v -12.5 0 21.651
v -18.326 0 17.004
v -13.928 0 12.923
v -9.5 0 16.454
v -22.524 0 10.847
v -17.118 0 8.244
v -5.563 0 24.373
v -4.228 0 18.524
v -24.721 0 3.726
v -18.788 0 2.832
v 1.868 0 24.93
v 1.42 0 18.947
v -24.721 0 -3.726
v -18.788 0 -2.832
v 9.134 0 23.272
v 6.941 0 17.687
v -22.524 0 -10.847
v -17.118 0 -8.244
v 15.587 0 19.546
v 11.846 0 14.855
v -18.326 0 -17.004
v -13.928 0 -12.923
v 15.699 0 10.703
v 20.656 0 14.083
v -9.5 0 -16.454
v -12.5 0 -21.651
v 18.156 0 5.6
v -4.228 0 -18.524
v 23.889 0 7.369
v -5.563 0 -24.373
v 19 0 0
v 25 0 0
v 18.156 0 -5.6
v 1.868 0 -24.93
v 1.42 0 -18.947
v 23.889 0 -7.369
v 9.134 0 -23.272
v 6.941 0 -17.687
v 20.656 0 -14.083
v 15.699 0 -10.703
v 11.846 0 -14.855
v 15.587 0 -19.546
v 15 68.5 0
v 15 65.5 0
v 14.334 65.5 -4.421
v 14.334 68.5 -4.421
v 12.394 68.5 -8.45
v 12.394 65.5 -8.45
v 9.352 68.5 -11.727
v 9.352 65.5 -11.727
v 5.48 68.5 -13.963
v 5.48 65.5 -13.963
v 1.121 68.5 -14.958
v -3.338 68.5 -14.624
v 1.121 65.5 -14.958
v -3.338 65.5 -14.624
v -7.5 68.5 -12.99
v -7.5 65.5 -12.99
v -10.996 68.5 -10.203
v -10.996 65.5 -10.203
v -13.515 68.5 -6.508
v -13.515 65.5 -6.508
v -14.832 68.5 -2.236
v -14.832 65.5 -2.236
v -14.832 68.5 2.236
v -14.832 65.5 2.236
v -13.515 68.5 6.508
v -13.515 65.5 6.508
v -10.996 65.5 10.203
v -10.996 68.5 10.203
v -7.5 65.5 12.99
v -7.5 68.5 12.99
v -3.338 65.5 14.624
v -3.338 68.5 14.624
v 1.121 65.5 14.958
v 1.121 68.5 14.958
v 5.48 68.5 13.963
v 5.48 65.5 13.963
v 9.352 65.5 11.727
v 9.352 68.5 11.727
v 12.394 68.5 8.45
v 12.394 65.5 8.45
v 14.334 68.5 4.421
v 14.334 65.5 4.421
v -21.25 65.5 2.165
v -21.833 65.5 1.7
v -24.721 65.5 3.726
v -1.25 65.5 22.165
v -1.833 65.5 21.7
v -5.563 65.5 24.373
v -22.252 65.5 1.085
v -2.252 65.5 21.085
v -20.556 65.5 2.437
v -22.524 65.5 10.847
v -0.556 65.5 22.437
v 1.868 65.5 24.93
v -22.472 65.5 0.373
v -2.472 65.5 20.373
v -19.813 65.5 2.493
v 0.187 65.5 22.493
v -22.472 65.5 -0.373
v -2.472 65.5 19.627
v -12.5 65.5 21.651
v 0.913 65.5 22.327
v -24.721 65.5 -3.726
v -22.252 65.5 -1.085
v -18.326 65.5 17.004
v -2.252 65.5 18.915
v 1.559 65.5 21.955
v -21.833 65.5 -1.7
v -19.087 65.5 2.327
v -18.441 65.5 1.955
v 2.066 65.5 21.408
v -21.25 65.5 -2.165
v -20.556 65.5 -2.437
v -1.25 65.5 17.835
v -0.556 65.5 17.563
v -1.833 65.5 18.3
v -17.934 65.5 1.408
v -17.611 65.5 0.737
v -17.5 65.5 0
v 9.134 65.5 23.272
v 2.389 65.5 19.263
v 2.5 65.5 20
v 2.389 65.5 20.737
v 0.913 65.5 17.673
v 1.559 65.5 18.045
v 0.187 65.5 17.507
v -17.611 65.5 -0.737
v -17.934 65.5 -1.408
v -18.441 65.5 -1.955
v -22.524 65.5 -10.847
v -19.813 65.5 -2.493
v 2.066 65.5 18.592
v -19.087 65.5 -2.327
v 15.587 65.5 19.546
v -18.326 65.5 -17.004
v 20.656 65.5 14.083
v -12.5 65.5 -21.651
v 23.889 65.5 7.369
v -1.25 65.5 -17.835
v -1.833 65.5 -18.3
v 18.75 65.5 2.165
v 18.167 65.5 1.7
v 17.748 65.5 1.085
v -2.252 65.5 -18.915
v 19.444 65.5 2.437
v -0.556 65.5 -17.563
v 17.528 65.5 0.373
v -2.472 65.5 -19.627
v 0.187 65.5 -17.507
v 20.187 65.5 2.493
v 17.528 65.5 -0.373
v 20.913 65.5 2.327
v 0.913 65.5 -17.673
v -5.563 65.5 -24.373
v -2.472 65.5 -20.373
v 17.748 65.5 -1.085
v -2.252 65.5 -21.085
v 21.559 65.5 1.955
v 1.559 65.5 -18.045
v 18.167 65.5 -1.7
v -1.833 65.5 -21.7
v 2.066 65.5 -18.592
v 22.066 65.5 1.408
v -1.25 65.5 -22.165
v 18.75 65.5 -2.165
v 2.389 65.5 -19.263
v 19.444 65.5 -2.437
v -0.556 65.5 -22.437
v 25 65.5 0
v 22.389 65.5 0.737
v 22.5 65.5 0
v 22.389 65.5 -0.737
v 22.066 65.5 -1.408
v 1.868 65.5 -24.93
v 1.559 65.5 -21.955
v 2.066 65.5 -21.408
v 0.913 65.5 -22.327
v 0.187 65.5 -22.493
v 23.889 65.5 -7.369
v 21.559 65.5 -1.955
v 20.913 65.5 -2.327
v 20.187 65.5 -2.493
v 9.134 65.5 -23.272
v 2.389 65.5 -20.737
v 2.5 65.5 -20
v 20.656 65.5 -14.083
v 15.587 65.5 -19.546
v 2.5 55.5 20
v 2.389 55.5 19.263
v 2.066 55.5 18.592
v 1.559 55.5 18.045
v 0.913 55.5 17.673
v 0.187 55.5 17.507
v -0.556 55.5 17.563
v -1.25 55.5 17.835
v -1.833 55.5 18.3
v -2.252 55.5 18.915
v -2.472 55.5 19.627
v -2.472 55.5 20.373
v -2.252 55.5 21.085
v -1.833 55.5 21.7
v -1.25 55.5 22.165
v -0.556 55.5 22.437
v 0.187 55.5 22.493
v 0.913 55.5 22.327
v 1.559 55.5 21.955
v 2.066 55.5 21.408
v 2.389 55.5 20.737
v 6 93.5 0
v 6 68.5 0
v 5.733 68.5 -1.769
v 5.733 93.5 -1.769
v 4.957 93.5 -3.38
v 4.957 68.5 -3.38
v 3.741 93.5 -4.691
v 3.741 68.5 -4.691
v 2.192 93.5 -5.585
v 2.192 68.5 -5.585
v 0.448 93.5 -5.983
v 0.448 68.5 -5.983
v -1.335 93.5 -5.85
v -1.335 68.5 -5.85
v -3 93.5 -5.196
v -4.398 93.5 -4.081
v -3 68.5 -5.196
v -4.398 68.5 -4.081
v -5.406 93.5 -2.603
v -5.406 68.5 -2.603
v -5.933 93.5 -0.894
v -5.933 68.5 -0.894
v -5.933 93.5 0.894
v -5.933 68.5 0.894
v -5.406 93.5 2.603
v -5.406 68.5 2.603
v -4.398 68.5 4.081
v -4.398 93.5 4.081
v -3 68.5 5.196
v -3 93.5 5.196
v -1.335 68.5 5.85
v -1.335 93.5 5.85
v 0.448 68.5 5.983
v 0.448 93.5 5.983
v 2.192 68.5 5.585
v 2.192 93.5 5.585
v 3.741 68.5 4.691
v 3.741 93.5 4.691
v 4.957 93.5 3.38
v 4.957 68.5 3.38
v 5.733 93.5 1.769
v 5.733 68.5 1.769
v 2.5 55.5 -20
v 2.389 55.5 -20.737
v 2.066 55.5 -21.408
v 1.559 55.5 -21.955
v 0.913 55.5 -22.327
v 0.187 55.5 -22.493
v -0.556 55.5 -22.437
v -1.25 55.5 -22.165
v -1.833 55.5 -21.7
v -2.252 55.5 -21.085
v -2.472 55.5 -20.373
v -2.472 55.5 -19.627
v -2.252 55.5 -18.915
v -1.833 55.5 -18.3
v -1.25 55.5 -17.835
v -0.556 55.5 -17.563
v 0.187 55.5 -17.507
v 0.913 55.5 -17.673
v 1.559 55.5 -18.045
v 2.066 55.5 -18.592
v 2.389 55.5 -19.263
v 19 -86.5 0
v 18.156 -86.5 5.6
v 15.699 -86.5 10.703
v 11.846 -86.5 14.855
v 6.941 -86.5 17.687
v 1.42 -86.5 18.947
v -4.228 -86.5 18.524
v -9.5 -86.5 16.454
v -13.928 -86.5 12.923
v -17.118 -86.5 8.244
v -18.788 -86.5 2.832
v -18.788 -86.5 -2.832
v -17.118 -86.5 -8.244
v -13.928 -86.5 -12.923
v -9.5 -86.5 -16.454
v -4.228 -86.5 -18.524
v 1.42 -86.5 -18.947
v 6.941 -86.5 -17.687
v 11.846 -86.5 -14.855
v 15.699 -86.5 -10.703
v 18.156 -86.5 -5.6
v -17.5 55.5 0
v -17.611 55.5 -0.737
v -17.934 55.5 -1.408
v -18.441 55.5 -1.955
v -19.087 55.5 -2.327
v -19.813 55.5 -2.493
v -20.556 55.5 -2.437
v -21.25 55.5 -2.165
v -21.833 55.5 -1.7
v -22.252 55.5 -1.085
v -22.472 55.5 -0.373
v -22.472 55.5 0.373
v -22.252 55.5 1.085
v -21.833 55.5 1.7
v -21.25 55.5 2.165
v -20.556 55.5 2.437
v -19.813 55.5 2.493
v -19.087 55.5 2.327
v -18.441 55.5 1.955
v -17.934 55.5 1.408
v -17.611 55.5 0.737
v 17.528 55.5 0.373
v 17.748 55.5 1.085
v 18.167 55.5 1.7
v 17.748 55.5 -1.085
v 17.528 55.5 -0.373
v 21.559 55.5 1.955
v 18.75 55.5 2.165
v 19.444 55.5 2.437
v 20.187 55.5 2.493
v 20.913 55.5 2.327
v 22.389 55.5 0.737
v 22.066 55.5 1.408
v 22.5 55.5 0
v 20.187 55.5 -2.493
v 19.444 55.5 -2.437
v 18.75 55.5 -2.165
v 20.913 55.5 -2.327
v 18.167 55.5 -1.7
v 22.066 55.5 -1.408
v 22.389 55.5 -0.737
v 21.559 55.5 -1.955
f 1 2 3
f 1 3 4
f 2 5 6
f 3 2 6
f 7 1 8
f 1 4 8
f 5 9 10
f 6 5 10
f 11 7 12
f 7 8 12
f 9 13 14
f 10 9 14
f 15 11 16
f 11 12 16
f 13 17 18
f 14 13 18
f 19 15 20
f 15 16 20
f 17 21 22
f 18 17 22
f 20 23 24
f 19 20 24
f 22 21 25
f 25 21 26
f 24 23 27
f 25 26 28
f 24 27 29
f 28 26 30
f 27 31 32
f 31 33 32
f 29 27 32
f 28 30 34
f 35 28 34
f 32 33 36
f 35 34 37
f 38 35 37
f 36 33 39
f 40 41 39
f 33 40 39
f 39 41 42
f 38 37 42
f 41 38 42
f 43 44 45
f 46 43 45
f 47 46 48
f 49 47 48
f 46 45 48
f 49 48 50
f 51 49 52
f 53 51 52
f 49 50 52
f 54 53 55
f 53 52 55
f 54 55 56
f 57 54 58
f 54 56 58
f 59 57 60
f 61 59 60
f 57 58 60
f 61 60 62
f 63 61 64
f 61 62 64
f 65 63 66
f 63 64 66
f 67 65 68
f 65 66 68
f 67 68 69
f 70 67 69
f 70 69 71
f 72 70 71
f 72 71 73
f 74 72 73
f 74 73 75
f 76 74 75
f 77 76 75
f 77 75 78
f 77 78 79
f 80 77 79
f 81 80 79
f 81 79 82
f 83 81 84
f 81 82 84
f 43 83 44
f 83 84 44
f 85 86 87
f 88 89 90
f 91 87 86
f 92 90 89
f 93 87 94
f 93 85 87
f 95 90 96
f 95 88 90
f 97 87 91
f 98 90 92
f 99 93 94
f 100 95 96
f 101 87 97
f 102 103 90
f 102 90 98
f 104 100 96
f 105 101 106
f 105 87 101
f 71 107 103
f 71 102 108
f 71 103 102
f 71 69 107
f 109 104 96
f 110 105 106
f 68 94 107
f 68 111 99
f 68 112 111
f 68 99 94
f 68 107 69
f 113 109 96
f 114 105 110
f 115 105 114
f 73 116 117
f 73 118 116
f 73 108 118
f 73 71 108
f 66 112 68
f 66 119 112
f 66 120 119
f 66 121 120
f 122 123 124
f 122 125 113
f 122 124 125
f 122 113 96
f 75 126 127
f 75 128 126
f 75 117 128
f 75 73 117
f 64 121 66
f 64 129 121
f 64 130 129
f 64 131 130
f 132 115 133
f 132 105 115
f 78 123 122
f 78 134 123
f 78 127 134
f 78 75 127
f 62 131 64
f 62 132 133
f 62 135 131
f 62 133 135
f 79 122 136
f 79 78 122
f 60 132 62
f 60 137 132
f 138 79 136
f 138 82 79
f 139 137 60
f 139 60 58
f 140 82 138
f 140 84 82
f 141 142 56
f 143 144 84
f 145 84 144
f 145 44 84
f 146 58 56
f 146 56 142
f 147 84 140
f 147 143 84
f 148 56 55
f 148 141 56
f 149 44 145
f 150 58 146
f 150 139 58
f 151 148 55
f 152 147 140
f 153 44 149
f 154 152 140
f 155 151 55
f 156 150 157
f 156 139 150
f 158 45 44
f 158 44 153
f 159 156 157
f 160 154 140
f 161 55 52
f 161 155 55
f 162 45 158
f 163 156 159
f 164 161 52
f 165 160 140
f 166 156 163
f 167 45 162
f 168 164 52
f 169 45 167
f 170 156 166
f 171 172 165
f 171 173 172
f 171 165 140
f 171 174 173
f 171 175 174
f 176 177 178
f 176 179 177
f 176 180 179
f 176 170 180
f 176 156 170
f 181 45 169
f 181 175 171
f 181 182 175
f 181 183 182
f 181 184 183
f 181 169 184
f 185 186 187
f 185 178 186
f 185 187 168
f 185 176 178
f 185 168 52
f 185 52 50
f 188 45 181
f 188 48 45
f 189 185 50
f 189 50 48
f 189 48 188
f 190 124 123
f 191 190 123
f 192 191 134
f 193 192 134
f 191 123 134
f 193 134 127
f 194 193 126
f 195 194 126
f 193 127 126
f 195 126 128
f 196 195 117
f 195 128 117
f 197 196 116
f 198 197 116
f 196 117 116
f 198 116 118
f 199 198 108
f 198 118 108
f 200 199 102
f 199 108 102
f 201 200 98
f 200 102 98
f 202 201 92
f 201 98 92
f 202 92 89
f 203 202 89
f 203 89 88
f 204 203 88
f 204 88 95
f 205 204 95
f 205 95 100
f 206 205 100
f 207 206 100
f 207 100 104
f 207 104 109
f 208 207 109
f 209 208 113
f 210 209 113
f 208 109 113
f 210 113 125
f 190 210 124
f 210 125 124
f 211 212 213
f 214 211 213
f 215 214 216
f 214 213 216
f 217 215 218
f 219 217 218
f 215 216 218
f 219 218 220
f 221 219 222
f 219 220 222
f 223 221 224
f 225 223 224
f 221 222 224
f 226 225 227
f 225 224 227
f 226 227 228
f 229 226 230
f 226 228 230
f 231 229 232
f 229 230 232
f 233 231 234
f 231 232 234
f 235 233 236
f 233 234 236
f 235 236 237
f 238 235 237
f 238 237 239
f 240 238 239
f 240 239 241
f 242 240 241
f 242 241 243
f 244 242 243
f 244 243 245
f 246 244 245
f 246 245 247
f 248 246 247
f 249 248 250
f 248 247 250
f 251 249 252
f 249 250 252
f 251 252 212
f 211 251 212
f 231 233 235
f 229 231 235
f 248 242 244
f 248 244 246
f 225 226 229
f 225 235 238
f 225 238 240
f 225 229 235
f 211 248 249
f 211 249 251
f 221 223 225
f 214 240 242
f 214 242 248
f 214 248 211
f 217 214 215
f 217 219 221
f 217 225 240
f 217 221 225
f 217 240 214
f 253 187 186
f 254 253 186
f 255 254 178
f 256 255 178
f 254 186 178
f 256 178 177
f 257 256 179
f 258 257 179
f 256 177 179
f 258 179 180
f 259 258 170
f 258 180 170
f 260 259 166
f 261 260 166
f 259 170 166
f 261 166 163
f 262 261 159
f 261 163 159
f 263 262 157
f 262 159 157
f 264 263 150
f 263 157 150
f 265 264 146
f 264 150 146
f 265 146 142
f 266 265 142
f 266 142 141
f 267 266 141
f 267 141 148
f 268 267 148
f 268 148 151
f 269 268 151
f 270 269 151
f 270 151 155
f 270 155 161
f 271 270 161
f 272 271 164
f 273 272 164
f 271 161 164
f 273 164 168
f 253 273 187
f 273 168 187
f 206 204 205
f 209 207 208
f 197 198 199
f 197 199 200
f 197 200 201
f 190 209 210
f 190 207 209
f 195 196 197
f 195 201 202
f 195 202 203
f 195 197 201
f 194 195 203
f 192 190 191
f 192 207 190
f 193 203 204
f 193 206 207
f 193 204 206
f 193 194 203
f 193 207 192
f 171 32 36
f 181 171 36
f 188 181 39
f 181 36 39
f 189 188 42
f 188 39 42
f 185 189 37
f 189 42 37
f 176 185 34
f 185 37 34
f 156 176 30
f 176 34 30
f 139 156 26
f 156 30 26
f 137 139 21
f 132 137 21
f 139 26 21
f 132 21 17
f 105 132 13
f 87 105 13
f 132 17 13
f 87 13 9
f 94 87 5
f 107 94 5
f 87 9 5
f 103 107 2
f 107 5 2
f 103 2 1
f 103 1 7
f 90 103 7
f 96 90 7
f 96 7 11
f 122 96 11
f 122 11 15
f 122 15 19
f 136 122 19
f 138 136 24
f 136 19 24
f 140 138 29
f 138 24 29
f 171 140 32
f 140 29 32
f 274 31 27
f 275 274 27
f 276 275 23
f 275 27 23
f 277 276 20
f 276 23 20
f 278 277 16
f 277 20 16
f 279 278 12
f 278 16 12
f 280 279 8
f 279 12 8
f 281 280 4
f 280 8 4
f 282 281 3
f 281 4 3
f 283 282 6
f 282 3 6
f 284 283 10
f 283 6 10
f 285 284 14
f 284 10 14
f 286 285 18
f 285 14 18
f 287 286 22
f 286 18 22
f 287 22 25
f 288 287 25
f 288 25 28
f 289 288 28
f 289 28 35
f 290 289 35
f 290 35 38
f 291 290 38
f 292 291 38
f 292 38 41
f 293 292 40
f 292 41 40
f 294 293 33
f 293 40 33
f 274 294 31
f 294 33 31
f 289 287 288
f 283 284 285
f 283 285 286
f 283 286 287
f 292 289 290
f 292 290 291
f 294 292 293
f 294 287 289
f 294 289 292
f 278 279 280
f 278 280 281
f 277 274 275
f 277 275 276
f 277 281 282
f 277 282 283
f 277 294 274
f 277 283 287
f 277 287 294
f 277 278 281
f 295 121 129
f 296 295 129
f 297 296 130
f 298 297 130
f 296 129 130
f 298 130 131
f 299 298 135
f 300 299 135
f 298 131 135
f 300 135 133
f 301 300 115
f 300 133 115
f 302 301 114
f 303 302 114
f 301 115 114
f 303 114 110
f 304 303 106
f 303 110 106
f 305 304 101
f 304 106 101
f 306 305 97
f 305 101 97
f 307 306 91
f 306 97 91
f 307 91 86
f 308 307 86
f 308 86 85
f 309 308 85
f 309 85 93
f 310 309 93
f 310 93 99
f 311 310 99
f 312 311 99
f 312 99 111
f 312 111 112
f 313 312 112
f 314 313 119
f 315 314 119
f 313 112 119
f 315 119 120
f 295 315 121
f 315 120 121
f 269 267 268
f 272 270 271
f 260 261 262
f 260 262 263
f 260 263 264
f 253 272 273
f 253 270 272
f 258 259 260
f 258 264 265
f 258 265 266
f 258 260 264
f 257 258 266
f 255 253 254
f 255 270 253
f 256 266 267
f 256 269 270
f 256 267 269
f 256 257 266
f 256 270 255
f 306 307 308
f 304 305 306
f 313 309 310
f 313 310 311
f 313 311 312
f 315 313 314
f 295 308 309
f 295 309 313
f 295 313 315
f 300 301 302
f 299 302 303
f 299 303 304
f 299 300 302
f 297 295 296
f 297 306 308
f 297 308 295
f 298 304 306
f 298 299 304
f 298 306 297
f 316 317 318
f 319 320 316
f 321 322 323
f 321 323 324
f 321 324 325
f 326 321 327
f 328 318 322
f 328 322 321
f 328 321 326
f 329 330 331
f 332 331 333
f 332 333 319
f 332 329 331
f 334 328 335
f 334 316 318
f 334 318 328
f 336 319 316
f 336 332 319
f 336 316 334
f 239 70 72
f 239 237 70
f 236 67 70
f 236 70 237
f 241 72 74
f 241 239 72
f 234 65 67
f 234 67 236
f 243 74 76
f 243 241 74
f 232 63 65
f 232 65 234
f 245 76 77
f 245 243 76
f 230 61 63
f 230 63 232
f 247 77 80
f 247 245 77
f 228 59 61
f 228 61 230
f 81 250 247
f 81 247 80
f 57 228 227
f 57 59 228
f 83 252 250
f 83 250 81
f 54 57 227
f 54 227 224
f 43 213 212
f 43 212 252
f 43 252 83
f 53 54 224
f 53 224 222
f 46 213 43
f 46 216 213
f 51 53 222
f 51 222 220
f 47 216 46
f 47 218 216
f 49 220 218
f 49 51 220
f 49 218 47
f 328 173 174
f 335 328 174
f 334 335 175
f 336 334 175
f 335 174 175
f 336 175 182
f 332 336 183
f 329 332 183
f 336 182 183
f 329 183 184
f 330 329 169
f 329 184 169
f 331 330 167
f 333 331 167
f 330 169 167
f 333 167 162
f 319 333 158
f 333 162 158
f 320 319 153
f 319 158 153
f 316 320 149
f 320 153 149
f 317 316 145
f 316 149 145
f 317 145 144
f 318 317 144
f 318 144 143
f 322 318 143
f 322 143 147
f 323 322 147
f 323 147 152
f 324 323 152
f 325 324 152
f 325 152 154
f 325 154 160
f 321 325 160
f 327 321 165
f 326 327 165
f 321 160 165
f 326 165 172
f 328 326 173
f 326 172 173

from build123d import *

# Parameters (mm, degrees)
SKETCH1_R           = 25
BOSS_EXTRUDE1_DEPTH = 65.5
SKETCH2_R           = 15
BOSS_EXTRUDE2_DEPTH = 3
SKETCH3_R           = 6
BOSS_EXTRUDE3_DEPTH = 25
SKETCH4_R           = 19
BOSS_EXTRUDE4_DEPTH = 86.5
SKETCH5_R           = 2.5
CUT_EXTRUDE1_DEPTH  = 10


with BuildPart() as part:
    # Sketch1 → Boss-Extrude1 (new body)
    with BuildSketch(Plane(origin=(0, 0, 0), x_dir=(1, 0, 0), z_dir=(0, 1, 0))):
        Circle(SKETCH1_R)
    extrude(amount=BOSS_EXTRUDE1_DEPTH)

    # Sketch2 → Boss-Extrude2 (add)
    with BuildSketch(Plane(origin=(0, 65.5, 0), x_dir=(1, 0, 0), z_dir=(0, 1, 0))):
        Circle(SKETCH2_R)
    extrude(amount=BOSS_EXTRUDE2_DEPTH)

    # Sketch3 → Boss-Extrude3 (add)
    with BuildSketch(Plane(origin=(0, 68.5, 0), x_dir=(1, 0, 0), z_dir=(0, 1, 0))):
        Circle(SKETCH3_R)
    extrude(amount=BOSS_EXTRUDE3_DEPTH)

    # Sketch4 → Boss-Extrude4 (add)
    with BuildSketch(Plane.XZ):
        Circle(SKETCH4_R)
    extrude(amount=BOSS_EXTRUDE4_DEPTH)

    # Sketch5 → Cut-Extrude1 (cut)
    with BuildSketch(Plane(origin=(0, 65.5, 0), x_dir=(1, 0, 0), z_dir=(0, 1, 0))):
        with Locations((0, 20)):
            Circle(SKETCH5_R)
        with Locations((20, 0)):
            Circle(SKETCH5_R)
        with Locations((0, -20)):
            Circle(SKETCH5_R)
        with Locations((-20, 0)):
            Circle(SKETCH5_R)
    extrude(amount=-CUT_EXTRUDE1_DEPTH, mode=Mode.SUBTRACT)


solid = part.part
